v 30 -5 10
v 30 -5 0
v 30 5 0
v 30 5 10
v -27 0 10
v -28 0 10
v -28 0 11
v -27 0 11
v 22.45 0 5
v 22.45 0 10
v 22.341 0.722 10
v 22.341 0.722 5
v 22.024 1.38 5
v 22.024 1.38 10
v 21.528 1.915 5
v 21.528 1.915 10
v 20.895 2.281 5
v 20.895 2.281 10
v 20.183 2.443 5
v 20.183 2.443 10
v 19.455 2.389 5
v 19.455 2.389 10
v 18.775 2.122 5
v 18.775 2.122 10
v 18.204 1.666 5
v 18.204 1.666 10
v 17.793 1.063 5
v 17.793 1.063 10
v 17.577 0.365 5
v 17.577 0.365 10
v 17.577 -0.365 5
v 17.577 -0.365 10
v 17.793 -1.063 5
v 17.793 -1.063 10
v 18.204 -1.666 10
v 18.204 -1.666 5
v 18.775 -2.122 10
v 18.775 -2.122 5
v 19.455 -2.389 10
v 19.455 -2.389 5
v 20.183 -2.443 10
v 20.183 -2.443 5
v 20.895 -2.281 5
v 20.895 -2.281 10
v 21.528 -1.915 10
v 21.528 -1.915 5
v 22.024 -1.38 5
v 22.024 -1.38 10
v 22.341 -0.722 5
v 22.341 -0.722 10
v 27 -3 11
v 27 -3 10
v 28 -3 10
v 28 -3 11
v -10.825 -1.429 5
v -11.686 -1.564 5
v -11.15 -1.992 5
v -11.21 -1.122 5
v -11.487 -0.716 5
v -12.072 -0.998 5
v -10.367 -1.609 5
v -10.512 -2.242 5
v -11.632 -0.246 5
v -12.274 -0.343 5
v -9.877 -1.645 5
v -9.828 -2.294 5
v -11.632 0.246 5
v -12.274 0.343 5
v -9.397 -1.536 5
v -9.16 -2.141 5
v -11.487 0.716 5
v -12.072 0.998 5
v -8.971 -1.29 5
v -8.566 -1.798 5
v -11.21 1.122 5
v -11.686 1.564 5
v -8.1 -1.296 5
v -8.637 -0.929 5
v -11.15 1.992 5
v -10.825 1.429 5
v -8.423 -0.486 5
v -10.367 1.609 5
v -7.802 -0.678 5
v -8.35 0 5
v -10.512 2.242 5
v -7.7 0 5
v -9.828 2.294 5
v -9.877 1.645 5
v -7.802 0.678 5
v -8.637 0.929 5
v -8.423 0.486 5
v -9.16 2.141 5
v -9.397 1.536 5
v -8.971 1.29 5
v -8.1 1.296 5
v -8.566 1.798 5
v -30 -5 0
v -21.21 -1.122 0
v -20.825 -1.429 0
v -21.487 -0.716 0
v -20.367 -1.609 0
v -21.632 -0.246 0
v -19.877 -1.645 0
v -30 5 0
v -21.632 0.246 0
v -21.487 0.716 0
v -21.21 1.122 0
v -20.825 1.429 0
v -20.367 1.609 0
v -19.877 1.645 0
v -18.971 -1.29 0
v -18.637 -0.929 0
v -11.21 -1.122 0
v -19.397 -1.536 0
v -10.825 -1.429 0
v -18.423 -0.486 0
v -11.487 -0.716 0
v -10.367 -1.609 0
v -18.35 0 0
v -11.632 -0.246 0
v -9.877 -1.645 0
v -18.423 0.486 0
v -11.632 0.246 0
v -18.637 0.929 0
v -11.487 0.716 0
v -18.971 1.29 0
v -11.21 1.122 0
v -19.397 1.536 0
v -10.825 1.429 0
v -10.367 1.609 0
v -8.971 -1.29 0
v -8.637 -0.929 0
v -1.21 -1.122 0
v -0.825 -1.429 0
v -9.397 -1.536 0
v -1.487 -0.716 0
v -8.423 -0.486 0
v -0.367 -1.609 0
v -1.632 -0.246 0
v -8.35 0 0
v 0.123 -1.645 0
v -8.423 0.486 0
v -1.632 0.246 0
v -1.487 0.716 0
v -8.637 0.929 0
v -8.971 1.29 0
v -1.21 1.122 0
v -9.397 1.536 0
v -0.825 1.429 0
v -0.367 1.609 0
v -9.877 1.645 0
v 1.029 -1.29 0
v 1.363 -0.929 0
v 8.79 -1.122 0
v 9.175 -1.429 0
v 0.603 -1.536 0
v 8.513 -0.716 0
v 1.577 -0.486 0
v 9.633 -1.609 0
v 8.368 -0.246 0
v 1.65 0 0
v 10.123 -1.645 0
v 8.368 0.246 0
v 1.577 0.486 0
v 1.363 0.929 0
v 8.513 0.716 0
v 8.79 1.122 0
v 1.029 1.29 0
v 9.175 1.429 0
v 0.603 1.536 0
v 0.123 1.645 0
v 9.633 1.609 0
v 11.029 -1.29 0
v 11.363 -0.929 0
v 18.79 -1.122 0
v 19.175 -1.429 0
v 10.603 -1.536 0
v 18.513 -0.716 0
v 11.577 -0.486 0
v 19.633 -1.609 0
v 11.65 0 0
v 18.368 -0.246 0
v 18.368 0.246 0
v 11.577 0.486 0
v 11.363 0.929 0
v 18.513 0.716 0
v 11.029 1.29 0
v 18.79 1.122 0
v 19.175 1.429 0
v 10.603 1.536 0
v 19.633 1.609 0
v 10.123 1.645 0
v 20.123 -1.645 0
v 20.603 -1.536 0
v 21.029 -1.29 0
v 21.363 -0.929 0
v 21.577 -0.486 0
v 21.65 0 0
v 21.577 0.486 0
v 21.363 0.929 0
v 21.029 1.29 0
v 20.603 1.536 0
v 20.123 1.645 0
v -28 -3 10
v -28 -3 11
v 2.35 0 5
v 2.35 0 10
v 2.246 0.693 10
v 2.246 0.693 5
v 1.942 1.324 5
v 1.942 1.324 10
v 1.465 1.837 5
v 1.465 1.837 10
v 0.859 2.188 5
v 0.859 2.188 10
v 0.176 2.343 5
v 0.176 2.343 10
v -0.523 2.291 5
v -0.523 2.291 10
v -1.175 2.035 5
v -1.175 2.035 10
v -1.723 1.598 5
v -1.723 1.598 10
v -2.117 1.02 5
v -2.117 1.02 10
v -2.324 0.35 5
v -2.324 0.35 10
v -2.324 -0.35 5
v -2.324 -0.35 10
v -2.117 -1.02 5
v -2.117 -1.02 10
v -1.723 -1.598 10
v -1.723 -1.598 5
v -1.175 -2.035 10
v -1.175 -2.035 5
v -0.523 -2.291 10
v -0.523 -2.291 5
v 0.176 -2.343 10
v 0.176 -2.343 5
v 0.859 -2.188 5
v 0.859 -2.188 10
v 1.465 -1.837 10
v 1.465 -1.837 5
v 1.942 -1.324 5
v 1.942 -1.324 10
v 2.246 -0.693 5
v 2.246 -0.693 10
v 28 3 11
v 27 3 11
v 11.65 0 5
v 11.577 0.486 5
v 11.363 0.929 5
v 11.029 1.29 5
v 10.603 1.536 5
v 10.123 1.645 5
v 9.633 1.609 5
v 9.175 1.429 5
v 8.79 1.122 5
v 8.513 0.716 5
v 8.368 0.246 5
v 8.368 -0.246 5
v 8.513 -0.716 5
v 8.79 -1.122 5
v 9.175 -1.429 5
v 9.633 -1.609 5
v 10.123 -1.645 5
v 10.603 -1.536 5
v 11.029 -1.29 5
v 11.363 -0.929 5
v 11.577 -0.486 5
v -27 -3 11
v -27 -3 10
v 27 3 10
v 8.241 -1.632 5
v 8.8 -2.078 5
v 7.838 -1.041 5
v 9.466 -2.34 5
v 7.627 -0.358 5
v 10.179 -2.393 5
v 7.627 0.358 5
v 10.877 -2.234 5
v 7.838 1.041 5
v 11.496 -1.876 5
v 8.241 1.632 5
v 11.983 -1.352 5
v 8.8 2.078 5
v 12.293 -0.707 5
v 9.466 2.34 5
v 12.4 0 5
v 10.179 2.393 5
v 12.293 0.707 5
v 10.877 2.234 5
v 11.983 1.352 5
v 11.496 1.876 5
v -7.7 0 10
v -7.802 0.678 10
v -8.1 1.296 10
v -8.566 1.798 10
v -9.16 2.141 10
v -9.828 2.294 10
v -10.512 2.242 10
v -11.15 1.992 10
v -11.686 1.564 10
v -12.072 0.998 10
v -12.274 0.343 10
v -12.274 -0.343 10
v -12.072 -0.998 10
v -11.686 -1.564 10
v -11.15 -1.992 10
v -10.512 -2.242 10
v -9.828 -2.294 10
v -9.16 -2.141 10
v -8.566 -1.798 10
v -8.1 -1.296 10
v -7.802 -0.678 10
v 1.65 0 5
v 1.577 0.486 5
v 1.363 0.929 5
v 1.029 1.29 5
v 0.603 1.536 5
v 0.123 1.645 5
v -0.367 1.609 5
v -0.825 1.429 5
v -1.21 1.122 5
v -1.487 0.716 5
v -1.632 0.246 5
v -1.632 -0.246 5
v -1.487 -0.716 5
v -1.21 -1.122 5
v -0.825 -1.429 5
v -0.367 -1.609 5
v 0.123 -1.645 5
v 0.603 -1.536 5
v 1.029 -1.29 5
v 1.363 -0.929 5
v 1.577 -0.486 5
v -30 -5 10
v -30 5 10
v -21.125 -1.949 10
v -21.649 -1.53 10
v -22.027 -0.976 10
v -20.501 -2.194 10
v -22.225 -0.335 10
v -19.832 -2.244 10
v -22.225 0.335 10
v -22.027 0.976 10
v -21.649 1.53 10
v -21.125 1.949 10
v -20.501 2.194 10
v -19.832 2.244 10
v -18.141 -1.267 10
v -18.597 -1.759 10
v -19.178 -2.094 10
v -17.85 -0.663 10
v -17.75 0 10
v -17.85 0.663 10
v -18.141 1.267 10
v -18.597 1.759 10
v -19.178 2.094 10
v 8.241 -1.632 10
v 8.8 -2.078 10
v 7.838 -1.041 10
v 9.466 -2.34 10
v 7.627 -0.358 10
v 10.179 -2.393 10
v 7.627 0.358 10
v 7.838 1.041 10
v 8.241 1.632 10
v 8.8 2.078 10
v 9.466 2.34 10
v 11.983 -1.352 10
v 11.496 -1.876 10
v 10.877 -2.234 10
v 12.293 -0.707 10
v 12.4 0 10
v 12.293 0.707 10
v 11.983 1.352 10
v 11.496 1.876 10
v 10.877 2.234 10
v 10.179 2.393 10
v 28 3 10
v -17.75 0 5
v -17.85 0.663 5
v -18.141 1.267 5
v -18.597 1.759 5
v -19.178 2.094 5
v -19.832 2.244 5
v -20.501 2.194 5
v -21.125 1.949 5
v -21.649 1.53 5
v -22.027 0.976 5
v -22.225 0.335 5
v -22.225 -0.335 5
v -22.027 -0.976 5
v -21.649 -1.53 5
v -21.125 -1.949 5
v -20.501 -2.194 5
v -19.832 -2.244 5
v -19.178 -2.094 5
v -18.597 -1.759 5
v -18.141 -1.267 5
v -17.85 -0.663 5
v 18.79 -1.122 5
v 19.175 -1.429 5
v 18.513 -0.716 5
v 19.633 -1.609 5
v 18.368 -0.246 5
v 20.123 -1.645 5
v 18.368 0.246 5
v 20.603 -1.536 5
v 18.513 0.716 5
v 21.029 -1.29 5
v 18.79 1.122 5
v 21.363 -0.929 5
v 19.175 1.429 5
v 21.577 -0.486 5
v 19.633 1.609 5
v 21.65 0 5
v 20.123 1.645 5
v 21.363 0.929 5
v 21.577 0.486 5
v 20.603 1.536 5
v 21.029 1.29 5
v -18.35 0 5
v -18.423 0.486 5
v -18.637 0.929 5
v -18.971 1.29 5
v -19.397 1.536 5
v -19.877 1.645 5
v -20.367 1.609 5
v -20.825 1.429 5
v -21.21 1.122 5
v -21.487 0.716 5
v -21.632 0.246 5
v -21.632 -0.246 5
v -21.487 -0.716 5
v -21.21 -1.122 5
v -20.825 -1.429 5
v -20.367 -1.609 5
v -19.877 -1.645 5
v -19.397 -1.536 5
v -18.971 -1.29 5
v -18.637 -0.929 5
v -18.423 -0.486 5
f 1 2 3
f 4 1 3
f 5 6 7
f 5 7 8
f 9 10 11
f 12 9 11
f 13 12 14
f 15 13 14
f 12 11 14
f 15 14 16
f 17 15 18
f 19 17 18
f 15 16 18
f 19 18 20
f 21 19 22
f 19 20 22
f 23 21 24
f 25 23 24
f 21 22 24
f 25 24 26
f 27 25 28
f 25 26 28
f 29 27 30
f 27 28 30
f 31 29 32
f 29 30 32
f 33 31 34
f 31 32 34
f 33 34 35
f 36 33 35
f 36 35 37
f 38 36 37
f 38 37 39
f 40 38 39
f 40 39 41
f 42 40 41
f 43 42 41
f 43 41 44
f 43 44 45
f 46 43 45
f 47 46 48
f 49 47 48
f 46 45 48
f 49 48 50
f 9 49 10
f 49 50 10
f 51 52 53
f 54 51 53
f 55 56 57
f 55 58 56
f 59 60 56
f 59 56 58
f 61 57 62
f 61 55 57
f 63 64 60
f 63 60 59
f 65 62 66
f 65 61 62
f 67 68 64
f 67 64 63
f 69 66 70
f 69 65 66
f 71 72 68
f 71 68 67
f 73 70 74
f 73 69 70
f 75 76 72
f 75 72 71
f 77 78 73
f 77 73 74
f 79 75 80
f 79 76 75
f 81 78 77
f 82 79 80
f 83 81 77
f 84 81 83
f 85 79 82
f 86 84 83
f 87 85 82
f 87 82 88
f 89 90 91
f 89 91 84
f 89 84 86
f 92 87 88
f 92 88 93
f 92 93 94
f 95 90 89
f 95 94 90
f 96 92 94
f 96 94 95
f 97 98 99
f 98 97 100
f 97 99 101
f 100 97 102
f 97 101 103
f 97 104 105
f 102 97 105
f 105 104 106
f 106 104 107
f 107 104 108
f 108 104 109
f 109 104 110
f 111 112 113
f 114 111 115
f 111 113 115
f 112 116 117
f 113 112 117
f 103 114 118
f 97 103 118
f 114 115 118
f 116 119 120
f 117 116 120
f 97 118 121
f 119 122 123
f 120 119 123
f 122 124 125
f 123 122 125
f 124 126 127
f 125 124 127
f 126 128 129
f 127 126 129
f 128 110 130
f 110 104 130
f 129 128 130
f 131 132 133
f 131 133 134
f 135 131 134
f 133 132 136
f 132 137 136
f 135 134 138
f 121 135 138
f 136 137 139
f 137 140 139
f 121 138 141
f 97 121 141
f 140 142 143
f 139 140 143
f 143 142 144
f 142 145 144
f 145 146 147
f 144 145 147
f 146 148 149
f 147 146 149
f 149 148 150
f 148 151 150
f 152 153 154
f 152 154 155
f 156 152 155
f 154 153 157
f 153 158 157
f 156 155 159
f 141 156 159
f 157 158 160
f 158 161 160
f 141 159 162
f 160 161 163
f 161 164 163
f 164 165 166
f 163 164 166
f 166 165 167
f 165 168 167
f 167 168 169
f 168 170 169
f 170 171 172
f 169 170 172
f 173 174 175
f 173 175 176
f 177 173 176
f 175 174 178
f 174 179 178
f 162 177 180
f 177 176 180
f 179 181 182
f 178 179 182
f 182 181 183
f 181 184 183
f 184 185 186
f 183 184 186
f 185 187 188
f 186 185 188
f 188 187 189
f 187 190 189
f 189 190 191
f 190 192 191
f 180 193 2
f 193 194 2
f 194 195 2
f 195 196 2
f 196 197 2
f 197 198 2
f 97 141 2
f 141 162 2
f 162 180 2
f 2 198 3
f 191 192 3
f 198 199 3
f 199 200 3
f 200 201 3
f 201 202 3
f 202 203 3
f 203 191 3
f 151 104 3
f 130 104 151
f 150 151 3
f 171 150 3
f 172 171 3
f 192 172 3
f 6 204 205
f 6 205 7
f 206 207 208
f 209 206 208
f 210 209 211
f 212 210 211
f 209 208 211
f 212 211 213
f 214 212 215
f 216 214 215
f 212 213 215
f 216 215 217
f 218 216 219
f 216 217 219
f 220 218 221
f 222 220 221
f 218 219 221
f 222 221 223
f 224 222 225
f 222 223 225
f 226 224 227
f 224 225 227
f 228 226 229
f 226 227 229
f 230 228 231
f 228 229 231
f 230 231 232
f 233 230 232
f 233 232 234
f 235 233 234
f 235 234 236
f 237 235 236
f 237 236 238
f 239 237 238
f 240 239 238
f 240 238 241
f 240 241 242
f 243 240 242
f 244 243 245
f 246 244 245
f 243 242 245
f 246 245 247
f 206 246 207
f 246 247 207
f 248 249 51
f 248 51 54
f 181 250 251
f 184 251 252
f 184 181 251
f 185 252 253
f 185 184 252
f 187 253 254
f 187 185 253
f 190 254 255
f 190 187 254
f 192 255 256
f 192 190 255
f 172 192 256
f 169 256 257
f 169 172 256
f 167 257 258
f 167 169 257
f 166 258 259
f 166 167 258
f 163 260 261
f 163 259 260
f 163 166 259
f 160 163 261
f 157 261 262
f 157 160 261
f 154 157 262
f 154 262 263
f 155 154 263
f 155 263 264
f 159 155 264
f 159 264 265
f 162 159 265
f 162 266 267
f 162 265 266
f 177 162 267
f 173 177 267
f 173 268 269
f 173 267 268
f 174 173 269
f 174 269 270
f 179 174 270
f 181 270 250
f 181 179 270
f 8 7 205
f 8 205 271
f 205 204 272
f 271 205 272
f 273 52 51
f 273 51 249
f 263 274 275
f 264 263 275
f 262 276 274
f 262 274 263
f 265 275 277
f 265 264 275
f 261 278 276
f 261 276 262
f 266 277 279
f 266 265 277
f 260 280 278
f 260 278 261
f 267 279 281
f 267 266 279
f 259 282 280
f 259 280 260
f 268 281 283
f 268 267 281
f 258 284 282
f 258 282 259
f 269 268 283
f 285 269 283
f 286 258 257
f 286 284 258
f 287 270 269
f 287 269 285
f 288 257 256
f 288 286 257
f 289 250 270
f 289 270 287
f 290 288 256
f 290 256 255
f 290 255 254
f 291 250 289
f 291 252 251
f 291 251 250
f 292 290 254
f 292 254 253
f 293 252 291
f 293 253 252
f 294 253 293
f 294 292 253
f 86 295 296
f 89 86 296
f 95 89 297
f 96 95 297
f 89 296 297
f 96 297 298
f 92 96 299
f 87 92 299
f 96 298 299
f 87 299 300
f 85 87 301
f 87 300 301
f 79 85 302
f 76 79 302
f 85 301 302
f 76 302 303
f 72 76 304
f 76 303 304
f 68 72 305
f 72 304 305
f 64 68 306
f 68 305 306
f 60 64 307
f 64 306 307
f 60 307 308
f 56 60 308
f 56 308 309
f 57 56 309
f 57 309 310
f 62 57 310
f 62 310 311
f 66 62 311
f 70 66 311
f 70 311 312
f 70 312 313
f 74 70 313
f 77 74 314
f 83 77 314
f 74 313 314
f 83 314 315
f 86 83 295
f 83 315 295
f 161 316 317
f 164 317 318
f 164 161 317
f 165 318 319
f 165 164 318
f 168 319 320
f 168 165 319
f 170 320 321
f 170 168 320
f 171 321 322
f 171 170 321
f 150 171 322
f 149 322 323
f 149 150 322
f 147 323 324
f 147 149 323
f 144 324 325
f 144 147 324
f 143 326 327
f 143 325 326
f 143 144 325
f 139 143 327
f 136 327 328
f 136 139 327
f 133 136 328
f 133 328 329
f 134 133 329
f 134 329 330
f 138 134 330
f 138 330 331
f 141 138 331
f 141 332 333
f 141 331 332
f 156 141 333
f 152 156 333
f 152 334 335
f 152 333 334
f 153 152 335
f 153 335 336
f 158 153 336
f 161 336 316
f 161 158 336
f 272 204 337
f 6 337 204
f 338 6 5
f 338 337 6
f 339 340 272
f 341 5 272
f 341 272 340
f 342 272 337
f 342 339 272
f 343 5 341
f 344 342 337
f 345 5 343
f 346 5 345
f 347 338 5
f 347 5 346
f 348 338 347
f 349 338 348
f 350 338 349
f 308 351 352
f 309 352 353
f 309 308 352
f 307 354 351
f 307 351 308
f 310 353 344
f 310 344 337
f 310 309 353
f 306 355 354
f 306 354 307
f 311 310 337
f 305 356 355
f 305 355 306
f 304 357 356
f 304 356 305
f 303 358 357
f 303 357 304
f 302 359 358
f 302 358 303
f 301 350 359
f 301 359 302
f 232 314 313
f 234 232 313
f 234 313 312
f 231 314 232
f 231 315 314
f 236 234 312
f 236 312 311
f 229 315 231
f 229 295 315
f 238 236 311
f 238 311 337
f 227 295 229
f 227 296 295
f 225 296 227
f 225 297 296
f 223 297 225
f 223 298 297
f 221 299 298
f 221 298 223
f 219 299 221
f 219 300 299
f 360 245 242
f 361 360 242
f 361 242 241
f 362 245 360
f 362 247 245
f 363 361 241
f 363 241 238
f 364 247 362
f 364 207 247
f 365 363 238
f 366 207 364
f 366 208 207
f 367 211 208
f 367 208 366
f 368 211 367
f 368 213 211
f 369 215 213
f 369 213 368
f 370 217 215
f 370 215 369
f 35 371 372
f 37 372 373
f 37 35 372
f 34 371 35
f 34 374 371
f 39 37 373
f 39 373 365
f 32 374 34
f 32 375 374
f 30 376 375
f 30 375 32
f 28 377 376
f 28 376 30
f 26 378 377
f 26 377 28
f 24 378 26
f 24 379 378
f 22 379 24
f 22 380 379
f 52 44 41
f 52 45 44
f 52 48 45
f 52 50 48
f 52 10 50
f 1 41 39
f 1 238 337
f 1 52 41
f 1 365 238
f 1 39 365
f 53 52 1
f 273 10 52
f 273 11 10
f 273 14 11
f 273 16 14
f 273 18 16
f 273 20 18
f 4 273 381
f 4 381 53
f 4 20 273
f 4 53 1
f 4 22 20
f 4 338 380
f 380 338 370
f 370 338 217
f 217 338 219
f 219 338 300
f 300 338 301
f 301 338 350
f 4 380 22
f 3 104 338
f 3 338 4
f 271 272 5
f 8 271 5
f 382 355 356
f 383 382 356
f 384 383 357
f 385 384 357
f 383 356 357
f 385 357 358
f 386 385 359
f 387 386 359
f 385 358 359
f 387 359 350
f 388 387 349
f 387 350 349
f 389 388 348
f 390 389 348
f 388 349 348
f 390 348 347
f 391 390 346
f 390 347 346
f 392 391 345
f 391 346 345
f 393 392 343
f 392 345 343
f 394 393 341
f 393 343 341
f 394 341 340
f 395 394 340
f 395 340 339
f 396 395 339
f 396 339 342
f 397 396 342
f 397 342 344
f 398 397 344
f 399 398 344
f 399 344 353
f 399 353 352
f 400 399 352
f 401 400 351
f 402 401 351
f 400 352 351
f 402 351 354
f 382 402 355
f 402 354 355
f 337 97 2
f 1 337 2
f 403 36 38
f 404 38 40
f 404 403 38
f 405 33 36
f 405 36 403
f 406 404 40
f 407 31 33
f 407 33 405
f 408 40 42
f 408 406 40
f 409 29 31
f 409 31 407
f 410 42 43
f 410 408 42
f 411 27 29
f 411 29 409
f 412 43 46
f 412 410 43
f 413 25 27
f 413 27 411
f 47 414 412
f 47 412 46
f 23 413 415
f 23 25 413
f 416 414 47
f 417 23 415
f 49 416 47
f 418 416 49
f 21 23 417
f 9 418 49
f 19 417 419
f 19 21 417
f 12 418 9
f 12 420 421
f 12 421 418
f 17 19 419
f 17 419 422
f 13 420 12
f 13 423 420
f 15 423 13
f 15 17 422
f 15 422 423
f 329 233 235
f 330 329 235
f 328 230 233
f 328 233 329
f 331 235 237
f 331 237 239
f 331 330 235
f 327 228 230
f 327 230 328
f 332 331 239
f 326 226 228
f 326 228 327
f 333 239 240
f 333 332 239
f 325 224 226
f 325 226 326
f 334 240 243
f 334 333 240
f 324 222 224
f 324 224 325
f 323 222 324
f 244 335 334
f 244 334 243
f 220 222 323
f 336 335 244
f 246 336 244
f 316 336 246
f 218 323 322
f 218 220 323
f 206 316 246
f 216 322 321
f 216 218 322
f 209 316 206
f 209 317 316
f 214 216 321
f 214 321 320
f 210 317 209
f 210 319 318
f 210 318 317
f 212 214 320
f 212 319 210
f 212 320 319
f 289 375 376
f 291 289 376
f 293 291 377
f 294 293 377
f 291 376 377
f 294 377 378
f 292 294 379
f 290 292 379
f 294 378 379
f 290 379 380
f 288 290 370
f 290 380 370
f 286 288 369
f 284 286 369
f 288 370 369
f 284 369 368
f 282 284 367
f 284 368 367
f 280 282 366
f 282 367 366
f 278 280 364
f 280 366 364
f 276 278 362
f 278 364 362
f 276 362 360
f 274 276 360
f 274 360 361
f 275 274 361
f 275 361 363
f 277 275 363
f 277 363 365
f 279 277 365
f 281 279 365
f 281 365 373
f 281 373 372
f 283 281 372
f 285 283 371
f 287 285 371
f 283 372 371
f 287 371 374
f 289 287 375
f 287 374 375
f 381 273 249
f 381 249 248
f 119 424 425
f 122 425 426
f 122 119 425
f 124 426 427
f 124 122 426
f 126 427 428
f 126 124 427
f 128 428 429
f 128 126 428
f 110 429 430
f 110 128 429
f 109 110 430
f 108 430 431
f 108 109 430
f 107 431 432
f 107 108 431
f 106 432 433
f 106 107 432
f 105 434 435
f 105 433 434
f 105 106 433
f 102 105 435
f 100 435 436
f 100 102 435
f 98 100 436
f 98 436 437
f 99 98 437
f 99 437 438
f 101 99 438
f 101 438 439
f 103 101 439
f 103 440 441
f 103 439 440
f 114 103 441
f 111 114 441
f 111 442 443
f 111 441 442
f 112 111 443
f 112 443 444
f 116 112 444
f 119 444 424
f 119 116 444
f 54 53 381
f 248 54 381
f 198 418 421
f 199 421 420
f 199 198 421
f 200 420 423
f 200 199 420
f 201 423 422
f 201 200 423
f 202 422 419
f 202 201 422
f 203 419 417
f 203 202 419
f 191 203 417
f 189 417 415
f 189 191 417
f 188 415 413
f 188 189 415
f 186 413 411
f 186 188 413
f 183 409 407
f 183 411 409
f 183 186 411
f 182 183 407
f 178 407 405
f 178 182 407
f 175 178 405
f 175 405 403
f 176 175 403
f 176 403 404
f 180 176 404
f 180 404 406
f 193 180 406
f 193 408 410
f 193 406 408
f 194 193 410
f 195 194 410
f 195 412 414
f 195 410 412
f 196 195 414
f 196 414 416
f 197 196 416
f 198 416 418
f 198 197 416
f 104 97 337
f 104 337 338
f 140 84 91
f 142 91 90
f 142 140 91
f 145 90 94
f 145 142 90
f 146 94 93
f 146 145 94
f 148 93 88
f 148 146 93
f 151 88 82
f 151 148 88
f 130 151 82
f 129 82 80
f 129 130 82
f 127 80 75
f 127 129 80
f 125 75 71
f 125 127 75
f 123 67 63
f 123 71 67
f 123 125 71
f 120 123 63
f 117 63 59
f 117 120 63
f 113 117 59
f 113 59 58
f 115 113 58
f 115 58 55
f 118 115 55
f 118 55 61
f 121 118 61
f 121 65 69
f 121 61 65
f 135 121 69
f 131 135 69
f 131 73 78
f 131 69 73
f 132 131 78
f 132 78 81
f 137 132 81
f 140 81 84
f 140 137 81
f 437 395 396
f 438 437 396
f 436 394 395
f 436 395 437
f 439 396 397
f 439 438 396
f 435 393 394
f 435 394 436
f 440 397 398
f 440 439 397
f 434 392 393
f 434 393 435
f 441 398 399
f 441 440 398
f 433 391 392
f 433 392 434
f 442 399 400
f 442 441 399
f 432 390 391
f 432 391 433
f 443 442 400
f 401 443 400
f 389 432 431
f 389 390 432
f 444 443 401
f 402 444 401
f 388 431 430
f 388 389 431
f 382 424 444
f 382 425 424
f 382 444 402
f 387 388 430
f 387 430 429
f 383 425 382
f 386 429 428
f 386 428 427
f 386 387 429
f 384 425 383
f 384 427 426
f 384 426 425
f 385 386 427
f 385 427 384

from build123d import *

# Parameters (mm, degrees)
SKETCH_W      = 60
SKETCH_H      = 10
SKETCH_R      = 1.65
PAD_DEPTH     = 10
SKETCH001_W   = 1
SKETCH001_H   = 3
SKETCH001_H_2 = 6
PAD001_DEPTH  = 1
SKETCH002_R   = 2.25
SKETCH002_R_2 = 2.3
SKETCH002_R_3 = 2.35
SKETCH002_R_4 = 2.4
SKETCH002_R_5 = 2.45
POCKET_DEPTH  = 5


with BuildPart() as part:
    # Sketch → Pad (new body)
    with BuildSketch(Plane.XY):
        Rectangle(SKETCH_W, SKETCH_H)
        with Locations((-20, 0)):
            Circle(SKETCH_R, mode=Mode.SUBTRACT)
        with Locations((-10, 0)):
            Circle(SKETCH_R, mode=Mode.SUBTRACT)
        Circle(SKETCH_R, mode=Mode.SUBTRACT)
        with Locations((10, 0)):
            Circle(SKETCH_R, mode=Mode.SUBTRACT)
        with Locations((20, 0)):
            Circle(SKETCH_R, mode=Mode.SUBTRACT)
    extrude(amount=PAD_DEPTH)

    # Sketch001 → Pad001 (join)
    with BuildSketch(Plane.XY.offset(10)):
        with Locations((-27.5, -1.5)):
            Rectangle(SKETCH001_W, SKETCH001_H)
        with Locations((27.5, 0)):
            Rectangle(SKETCH001_W, SKETCH001_H_2)
    extrude(amount=PAD001_DEPTH)

    # Sketch002 (on Face11 of Pad) → Pocket (cut)
    with BuildSketch(Plane.XY.offset(10)):
        with Locations((-20, 0)):
            Circle(SKETCH002_R)
        with Locations((-10, 0)):
            Circle(SKETCH002_R_2)
        Circle(SKETCH002_R_3)
        with Locations((10, 0)):
            Circle(SKETCH002_R_4)
        with Locations((20, 0)):
            Circle(SKETCH002_R_5)
    extrude(amount=-POCKET_DEPTH, mode=Mode.SUBTRACT)


solid = part.part
